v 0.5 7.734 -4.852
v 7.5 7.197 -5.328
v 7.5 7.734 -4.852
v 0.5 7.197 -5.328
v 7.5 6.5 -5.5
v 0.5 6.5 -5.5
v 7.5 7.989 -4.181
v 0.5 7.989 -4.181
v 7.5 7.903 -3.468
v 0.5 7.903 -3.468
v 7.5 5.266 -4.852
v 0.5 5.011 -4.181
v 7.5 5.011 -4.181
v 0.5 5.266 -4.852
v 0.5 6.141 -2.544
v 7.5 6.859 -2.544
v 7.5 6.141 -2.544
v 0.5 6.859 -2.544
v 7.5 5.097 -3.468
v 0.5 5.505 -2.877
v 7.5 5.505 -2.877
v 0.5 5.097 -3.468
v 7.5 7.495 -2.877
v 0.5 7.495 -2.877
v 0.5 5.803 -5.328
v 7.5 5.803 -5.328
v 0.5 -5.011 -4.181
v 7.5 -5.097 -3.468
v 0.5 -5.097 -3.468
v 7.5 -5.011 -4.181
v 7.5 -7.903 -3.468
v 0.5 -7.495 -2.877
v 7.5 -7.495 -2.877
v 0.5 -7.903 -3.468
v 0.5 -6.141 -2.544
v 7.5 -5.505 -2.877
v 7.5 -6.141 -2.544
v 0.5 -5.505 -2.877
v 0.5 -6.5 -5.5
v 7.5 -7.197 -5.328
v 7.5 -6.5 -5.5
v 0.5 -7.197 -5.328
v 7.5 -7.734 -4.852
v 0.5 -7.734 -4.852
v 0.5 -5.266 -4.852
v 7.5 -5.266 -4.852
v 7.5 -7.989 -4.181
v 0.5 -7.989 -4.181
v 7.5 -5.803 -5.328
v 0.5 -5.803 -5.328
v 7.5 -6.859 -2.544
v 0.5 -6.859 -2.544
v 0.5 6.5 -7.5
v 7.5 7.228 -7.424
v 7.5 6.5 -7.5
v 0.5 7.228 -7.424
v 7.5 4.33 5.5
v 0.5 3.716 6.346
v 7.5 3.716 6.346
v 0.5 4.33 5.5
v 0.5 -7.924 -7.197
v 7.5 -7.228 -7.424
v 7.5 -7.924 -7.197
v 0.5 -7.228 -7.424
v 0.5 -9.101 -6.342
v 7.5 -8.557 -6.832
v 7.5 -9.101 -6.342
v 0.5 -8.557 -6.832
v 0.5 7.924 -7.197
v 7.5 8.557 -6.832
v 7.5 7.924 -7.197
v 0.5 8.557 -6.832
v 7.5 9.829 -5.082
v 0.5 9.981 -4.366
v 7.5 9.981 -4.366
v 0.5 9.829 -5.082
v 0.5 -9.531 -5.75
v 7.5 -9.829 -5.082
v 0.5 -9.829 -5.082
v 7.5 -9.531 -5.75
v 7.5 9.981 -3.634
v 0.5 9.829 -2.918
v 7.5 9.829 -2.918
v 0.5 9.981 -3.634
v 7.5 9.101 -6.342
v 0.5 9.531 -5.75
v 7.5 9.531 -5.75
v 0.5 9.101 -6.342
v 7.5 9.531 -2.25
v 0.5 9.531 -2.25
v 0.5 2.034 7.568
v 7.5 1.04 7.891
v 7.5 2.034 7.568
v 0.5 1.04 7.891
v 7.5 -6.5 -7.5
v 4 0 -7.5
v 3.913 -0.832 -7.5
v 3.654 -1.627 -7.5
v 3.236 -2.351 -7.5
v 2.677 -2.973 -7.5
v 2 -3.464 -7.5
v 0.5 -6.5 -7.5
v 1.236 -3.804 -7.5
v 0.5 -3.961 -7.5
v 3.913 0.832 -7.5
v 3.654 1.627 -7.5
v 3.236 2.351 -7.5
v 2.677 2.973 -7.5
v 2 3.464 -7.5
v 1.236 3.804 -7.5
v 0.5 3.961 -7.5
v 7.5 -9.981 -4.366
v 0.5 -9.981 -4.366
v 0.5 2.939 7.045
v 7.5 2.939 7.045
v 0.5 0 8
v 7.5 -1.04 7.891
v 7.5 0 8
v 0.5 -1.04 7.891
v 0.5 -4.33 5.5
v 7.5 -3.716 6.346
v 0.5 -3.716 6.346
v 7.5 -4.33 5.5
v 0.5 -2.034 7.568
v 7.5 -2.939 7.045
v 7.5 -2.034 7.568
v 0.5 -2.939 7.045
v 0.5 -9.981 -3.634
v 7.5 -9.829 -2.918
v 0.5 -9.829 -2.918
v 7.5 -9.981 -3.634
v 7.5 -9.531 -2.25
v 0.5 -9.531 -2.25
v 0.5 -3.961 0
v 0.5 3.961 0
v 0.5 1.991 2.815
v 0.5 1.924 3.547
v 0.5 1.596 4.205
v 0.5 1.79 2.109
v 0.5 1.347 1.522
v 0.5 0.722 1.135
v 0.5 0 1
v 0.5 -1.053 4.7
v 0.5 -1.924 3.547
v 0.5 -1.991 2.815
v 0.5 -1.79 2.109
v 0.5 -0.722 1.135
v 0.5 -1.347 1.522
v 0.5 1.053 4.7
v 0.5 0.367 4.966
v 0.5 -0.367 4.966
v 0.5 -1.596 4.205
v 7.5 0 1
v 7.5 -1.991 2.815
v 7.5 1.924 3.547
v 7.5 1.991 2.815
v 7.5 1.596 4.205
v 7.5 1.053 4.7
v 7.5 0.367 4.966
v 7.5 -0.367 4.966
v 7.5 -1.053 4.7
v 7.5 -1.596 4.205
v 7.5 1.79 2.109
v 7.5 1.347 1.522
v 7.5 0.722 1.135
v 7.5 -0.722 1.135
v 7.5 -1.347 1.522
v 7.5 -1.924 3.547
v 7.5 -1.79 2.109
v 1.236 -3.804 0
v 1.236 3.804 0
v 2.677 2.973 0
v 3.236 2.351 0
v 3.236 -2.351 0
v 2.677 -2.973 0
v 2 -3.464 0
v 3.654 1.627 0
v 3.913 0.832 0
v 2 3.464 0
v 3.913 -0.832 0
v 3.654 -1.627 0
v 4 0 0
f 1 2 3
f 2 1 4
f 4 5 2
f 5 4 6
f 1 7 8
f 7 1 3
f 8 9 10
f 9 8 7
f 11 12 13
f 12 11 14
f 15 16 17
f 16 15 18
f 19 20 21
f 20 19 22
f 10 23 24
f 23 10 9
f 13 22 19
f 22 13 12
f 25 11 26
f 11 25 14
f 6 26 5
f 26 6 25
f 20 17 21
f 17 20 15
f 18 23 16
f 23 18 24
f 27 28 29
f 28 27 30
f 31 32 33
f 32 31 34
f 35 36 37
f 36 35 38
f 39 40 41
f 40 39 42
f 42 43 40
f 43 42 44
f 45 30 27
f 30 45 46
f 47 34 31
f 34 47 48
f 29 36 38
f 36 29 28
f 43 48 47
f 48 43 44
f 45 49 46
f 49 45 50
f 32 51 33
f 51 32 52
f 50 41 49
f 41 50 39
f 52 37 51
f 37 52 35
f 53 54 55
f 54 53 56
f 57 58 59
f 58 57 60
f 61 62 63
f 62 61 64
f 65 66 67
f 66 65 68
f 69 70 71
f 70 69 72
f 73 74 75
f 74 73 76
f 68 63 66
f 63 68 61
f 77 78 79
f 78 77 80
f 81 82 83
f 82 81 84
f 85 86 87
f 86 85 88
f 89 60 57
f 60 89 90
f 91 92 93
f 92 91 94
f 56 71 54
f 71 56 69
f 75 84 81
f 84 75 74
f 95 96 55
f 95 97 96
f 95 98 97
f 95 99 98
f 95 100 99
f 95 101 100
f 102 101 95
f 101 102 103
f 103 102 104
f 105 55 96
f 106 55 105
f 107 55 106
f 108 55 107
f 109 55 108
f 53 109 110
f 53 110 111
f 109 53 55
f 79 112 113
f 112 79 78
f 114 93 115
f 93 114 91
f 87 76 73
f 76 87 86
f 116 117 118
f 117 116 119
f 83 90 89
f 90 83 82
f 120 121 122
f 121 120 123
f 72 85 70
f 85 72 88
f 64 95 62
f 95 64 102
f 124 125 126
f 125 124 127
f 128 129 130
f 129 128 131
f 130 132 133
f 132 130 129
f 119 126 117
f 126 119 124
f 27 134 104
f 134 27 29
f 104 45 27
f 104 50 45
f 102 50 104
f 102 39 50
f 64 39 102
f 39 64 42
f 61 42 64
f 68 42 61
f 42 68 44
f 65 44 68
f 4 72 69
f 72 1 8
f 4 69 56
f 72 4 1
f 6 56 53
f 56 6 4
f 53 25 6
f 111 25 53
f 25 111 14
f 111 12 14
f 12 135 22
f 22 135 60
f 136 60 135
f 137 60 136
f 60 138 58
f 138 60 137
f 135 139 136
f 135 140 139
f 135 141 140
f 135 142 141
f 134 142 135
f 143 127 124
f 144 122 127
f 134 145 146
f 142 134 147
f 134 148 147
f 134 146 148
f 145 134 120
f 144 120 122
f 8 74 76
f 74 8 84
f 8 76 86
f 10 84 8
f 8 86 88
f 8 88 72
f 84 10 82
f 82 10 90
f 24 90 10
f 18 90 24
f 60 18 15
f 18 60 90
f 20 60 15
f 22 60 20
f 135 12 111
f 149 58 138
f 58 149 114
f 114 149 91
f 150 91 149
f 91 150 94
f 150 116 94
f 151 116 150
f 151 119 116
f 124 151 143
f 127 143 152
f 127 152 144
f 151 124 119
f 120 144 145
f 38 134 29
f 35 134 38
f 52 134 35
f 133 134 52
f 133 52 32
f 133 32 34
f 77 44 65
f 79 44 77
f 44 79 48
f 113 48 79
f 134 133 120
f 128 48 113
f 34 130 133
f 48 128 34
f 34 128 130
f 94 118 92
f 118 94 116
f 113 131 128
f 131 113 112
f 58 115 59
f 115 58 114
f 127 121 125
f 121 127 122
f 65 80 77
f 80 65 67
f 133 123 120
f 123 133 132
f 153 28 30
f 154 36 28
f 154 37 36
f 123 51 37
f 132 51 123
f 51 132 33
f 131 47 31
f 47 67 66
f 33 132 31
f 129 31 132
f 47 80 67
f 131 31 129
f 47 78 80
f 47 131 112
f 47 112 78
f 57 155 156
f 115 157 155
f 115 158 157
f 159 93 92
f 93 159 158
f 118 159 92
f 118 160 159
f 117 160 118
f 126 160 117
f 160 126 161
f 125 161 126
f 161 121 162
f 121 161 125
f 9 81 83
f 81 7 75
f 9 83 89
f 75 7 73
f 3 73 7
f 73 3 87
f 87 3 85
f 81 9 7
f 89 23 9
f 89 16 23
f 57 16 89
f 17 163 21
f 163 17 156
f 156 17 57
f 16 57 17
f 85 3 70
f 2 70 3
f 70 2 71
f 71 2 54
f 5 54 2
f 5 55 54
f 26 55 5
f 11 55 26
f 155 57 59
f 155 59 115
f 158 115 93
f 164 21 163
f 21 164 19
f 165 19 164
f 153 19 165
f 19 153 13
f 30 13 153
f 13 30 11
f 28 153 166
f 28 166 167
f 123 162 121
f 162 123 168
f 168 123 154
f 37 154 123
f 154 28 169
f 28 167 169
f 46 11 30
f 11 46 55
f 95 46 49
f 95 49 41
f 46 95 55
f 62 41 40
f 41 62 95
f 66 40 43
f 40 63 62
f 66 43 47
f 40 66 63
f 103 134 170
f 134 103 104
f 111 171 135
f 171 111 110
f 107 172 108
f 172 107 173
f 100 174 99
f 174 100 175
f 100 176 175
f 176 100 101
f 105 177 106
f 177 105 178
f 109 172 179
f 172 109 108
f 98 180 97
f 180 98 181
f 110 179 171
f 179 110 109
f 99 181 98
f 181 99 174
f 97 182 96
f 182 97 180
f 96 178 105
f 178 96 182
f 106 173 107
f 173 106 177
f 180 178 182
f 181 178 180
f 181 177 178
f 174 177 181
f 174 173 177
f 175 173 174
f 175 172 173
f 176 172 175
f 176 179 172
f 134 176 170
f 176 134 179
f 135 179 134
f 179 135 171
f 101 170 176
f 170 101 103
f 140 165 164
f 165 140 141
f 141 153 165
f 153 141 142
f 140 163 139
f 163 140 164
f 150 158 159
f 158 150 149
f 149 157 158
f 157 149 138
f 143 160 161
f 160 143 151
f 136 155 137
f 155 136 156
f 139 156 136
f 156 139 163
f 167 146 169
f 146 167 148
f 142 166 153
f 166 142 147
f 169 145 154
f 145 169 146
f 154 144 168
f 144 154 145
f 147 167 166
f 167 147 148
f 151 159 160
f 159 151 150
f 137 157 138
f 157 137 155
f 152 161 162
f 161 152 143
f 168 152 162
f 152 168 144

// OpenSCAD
$fs=.75;

rotate(a = [0, 90, 0]) {
	difference() {
		translate(v = [0, 0, 0.5000000000]) {
			hull() {
				union() {
					translate(v = [4, 6.5000000000, 0]) {
						cylinder(d = 7, h = 7);
					}
					mirror(v = [0, 1, 0]) {
						translate(v = [4, 6.5000000000, 0]) {
							cylinder(d = 7, h = 7);
						}
					}
				}
				translate(v = [-3, 0, 0]) {
					cylinder(d = 10, h = 7);
				}
			}
		}
		rotate(a = [0, 90, 0]) {
			cylinder(d = 8.0000000000, h = 20);
		}
		union() {
			translate(v = [4, 6.5000000000, 0]) {
				translate(v = [0, 0, -50.0000000000]) {
					cylinder(d = 3, h = 100);
				}
			}
			mirror(v = [0, 1, 0]) {
				translate(v = [4, 6.5000000000, 0]) {
					translate(v = [0, 0, -50.0000000000]) {
						cylinder(d = 3, h = 100);
					}
				}
			}
		}
		translate(v = [-3, 0, 0]) {
			translate(v = [0, 0, -50.0000000000]) {
				cylinder(d = 4, h = 100);
			}
		}
	}
}
/***********************************************
*********      SolidPython code:      **********
************************************************
 
from solid import *
from solid import extensions

class Object:
    pass


rod=Object()
rod.d=8.0

nema17 = Object()
nema17.side = 43.
nema17.holeDistance = 31.0
nema17.screwD= 3.
nema17.height = 34. #47 for the long ones, 34 for the short ones


bearing = Object()
bearing.outD = 15.0
bearing.length = 24.0

# to place the rod supports on top of the nema17
supportDepth=10
xRodHole = cylinder(d=rod.d, h=20).rot(y=90)
xSupport = ( cube([supportDepth,nema17.side,rod.d/2+1]).align('left','bottom')
             - xRodHole.move(z=-.5)
             - cylinder(d=nema17.screwD,h=12).center().move(x=5,y=nema17.holeDistance/2.).mirrorCopy('y')
           ).rot(x=180)


bearingShape = cylinder(d=bearing.outD, h= bearing.length+1).center()

#minimal y cart, z motor will be placed in between the rails
yRodDistance = 60.0 # rounding up from nema17.side + bearing.outD
wall=2.0
cartWidth = 2*bearing.length
yBearings = bearingShape.move(z=bearing.length/2).mirrorCopy('z').move(x=yRodDistance/2).mirrorCopy('x')
yCart = ( ( cylinder(d= bearing.outD + 2*wall, h= cartWidth).center().rot(x=90).move(x=yRodDistance/2).mirrorCopy('x')
          + cube([yRodDistance, cartWidth, bearing.outD/2+wall]).align('bottom').move(z=-bearing.outD/2-wall)
          + cube([yRodDistance+bearing.outD+2*wall, cartWidth, bearing.outD/2+wall]).align('top').move(z=bearing.outD/2+wall)

          ) - yBearings.rot(x=90)
            - cube([nema17.side, cartWidth, bearing.outD/2-3]).align('top')
            - cube([nema17.side, cartWidth, bearing.outD]).align('bottom')
            - cube([yRodDistance+20, cartWidth, 3]).align('bottom').move(z=-bearing.outD/2-wall)
            - cylinder(d=3,h=10).move([nema17.holeDistance/2, nema17.holeDistance/2, -bearing.outD/2]).mirrorCopy('x').mirrorCopy('y').debug()
            - cylinder(d=nema17.holeDistance, h =10).move(z=-bearing.outD/2)
          )



#supports for holding the y rods in from the x bearings
bearingCover = cylinder(d= bearing.outD + 2*wall, h= bearing.length).center().rot(y=90)
baseBlock = hull( bearingCover
                  + cube([bearing.outD+2,10,bearing.outD+2]).align('back').move(y=bearing.outD/2+wall))
capScrews = cylinder(d=3., h=bearing.outD + 2*wall).center().move(x=rod.d/2+3./2+1,y=12).mirrorCopy('x')
rodHole = cylinder(d=rod.d,h=10).rot(x=-90).move(y=bearing.outD/2+wall)
#capTopBase = cube([bearing.length, 11, bearing.outD]).center('x').move(y=bearing.outD/2+wall)
#capTopBase = polygon([[0,0],[0,10],[10,10],[10,-3]]).linear_extrude(bearing.length,True).rot(y=-90).move(y=bearing.outD/2+wall)
capTopBase = cube([bearing.length, 20, bearing.outD]).center('x')-bearingCover

baseSupport = baseBlock - rodHole - capScrews

ySupport = part(cylinder(d= bearing.outD + 2*wall, h= yRodDistance + bearing.length).center().rot(y=90)
                 - hole(cylinder(d= bearing.outD, h= yRodDistance + bearing.length).center().rot(y=90))
                 + ( baseSupport
                     * cube(50).align('top')
                   ).move(x=yRodDistance/2).mirrorCopy('x')
                 - cube(1000).align('top').move(z=-bearing.outD/2+1)
                 )

ySupportRodCap = ( baseSupport
                * capTopBase
                - cube([bearing.length,50,1]).align('bottom')
                - cube([bearing.length,10,10]).center('xy')
                )

#support for z rods placed on the falt surface of the yCart above the bearings
zRodDistance = 31.
rodSupport = (cylinder(d=rod.d + 3, h=6) - cylinder(d=rod.d, h=6+1)).move(y=zRodDistance / 2)
beltGuide = ( cube([bearing.outD, bearing.length-zRodDistance/2, 6]).center('x')
              - cylinder(d=rod.d + 6,h=6+1)
              - cube([1,20,6+1]).center('x')).move(y=zRodDistance/2)
zSupport = ( cube([bearing.outD,2*bearing.length,wall]).center('xy')
             + rodSupport.move(z=wall).mirrorCopy('y')
             + beltGuide.move(z=wall).mirrorCopy('y')
           )

zstepper = cube([nema17.side,nema17.side,34]).center('xy').move(z=-bearing.outD/2).color('gray')


yCartZSupport = yCart + zSupport.move(x=yRodDistance/2 ,z=bearing.outD/2)


def xTailBase(h):
    return hull([cylinder(d=3+4,h=h).move(x= 4, y=3./2+rod.d/2+1).mirrorCopy('y'),
                 cylinder(d=4+6, h=h).move(x=-3)
                ]).move(z=.5)

capScrewHoles = cylinder(d=3,h=100).center().move(x= 4, y=3./2+rod.d/2+1).mirrorCopy('y')
pulleyScrewHole = cylinder(d=4,h=100).center().move(x= -3)
nutCuts = (cylinder(d=3+4,h=nema17.height-7).move(x= 4, y=3./2+rod.d/2+1).mirrorCopy('y')
          + cylinder(d=4+6, h=nema17.height-7).move(x=-3)).move(z=7)
xTailSupport = ( xTailBase(nema17.height+1.5+rod.d/2.)
                 - xRodHole
                 - capScrewHoles
                 - pulleyScrewHole
                 - nutCuts
               )
xTailCap = ( xTailBase(7)
             - xRodHole
             - capScrewHoles
             - pulleyScrewHole
            )

def xFrontBase(h):
    return hull([cylinder(d=3+4,h=h).move(y=3./2+rod.d/2+1).mirrorCopy('y'),
                ]).move(x=3.5,z=.5)

capScrewHoles = cylinder(d=3,h=100).center().move(x=3.5,y=3./2+rod.d/2+1).mirrorCopy('y')
nutCuts = (cylinder(d=3+4,h=nema17.height-7).move(x=3.5,y=3./2+rod.d/2+1).mirrorCopy('y')
          ).move(z=7)
xSupportH=nema17.height+1.5+rod.d/2.
nemaSupport = ( hull(cube([10,nema17.side,1.5]).align('right','top').move(z=xSupportH-nema17.height)
                     + cylinder(d=3+4,h=xSupportH-nema17.height-.5).move(y=3./2+rod.d/2+1).mirrorCopy('y').move(x=3.5,z=.5)
                    )
                - cylinder(d=3,h=10).move(x=-(nema17.side-nema17.holeDistance)/2,y=nema17.holeDistance/2).mirrorCopy('y'))
nemaSupport = ( hull(cylinder(d=3+4,h=1.5).move(x=-(nema17.side-nema17.holeDistance)/2,y=nema17.holeDistance/2,z=xSupportH-nema17.height).mirrorCopy('y')
                     + cylinder(d=3+4,h=xSupportH-nema17.height-.5).move(y=3./2+rod.d/2+1).mirrorCopy('y').move(x=3.5,z=.5)
                    )
                - cylinder(d=3,h=10).move(x=-(nema17.side-nema17.holeDistance)/2,y=nema17.holeDistance/2).mirrorCopy('y'))
xFrontSupport = ( xFrontBase(xSupportH)
                 + nemaSupport
                 - xRodHole.move(x=-10)
                 - capScrewHoles
                 - nutCuts
               )
xFrontCap = ( xFrontBase(7)
             - xRodHole.move(x=-10)
             - capScrewHoles
            )


zTopH=5.
zBearingD = 16.
zTopBase = hull(cylinder(d=rod.d+6,h=zTopH).move(y=zRodDistance/2).mirrorCopy('y')
            +cylinder(d=zBearingD+6,h=zTopH).move(x=-yRodDistance/2))
zHoles =  (cylinder(d=rod.d,h=zTopH).move(y=zRodDistance/2).mirrorCopy('y')
           + cylinder(d=zBearingD,h=zTopH).move(x=-yRodDistance/2))
zTop = zTopBase - zHoles




zNutD0 = 10.
zNutD1 = 22.
zNutH0 = 10.
drillD = 36.

base = ( hull(cylinder(d=bearing.outD+6,h=bearing.length).move(y=zRodDistance/2).mirrorCopy('y')
              + cylinder(d=zNutD1+2,h=bearing.length).move(x=-yRodDistance/2)
              + cylinder(d=drillD+6,h=bearing.length).move(x=drillD/2+5)
              + cube([.1,25,zNutH0]).center('y').move(x=drillD+5)
              )
            + cube([8,25,zNutH0]).center('y').move(x=drillD+5)
        )

holes =  (cylinder(d=bearing.outD, h=bearing.length).move(y=zRodDistance/2).mirrorCopy('y')
           + cylinder(d=zNutD0+1,h=bearing.length).move(x=-yRodDistance/2)
           + cylinder(d=drillD,h=bearing.length).move(x=drillD/2+5)
           + cube([20,2,zNutH0]).center('xy').move(x=drillD+7)
           + cylinder(d=3,h=30).center().rot(x=90).move(x=drillD+9,z=zNutH0/2).debug()
           )

zNutDrills = cylinder(d=3,h=bearing.length).move(x=17./2).rot(z=45).mirrorCopy('y').mirrorCopy('x').move(x=-yRodDistance/2)

def ushape(p,f=.5):
    return (cylinder(d=100.*f,h=100.).center().rot(x=90)-cube([500.*f,100,100]).center('yz')
            +cube([50.*(1-f),100.,100.*f]).center('yz')

           ).move(x=(.5-f)*-50).resize(p)

pD=[40,60,30]
pN=[35,60,30]
profileCuts = (ushape(pD,.5).move(x=pD[0]/2+bearing.outD/2,z=pD[2]/2+zNutH0)+
           ushape(pN,.4).mirror('x').move(x=-pN[0]/2-bearing.outD/2,z=pN[2]/2+zNutH0)
          )

sideCuts = cube([100,20,bearing.length]).center('x').move(y=zRodDistance/2+bearing.outD/2-1).mirrorCopy('y')

zDrillCart_ = base - holes - zNutDrills  - profileCuts

zDrillCart = zDrillCart_.copy() #- sideCuts
zDrillCart0 = zDrillCart_.copy().intersection(cube([60,60,bearing.length]).center('y').move(x=-bearing.outD/2+1))

scene = xFrontSupport +xFrontCap.move(x=-20)


'''
scene = ( xSupport.move(x=-100)
          + ySupport + ySupportRodCap.move(x=-yRodDistance / 2, z=3)
          + (yCartZSupport ).move(y=50)
        )
'''
scad_render_to_file(scene, 'routerParts.scad', '$fs=.75;')

#scad_render_to_file(xSupport, 'routerParts_xSupport.scad', '$fs=.75;')
#scad_render_to_file(ySupport, 'routerParts_ySupport.scad', '$fs=.75;')
#scad_render_to_file(ySupportRodCap, 'routerParts_ySupportCap.scad', '$fs=.75;')
#scad_render_to_file(yCartZSupport, 'routerParts_yCart.scad', '$fs=.75;')
scad_render_to_file( xTailSupport.rot(y=90), 'routerParts_xTailSupport.scad', '$fs=.75;')
scad_render_to_file( xTailCap.rot(y=90), 'routerParts_xTailCap.scad', '$fs=.75;')
scad_render_to_file( xFrontSupport.rot(y=90), 'routerParts_xFrontSupport.scad', '$fs=.75;')
scad_render_to_file( xFrontCap.rot(y=90), 'routerParts_xFrontCap.scad', '$fs=.75;')
#scad_render_to_file( zTop, 'routerParts_zTop.scad', '$fs=.75;')
#scad_render_to_file( zDrillCart, 'routerParts_zDrillCart.scad', '$fs=.75;')
#scad_render_to_file( zDrillCart0, 'routerParts_zDrillCart0.scad', '$fs=.75;')
 
 
************************************************/
